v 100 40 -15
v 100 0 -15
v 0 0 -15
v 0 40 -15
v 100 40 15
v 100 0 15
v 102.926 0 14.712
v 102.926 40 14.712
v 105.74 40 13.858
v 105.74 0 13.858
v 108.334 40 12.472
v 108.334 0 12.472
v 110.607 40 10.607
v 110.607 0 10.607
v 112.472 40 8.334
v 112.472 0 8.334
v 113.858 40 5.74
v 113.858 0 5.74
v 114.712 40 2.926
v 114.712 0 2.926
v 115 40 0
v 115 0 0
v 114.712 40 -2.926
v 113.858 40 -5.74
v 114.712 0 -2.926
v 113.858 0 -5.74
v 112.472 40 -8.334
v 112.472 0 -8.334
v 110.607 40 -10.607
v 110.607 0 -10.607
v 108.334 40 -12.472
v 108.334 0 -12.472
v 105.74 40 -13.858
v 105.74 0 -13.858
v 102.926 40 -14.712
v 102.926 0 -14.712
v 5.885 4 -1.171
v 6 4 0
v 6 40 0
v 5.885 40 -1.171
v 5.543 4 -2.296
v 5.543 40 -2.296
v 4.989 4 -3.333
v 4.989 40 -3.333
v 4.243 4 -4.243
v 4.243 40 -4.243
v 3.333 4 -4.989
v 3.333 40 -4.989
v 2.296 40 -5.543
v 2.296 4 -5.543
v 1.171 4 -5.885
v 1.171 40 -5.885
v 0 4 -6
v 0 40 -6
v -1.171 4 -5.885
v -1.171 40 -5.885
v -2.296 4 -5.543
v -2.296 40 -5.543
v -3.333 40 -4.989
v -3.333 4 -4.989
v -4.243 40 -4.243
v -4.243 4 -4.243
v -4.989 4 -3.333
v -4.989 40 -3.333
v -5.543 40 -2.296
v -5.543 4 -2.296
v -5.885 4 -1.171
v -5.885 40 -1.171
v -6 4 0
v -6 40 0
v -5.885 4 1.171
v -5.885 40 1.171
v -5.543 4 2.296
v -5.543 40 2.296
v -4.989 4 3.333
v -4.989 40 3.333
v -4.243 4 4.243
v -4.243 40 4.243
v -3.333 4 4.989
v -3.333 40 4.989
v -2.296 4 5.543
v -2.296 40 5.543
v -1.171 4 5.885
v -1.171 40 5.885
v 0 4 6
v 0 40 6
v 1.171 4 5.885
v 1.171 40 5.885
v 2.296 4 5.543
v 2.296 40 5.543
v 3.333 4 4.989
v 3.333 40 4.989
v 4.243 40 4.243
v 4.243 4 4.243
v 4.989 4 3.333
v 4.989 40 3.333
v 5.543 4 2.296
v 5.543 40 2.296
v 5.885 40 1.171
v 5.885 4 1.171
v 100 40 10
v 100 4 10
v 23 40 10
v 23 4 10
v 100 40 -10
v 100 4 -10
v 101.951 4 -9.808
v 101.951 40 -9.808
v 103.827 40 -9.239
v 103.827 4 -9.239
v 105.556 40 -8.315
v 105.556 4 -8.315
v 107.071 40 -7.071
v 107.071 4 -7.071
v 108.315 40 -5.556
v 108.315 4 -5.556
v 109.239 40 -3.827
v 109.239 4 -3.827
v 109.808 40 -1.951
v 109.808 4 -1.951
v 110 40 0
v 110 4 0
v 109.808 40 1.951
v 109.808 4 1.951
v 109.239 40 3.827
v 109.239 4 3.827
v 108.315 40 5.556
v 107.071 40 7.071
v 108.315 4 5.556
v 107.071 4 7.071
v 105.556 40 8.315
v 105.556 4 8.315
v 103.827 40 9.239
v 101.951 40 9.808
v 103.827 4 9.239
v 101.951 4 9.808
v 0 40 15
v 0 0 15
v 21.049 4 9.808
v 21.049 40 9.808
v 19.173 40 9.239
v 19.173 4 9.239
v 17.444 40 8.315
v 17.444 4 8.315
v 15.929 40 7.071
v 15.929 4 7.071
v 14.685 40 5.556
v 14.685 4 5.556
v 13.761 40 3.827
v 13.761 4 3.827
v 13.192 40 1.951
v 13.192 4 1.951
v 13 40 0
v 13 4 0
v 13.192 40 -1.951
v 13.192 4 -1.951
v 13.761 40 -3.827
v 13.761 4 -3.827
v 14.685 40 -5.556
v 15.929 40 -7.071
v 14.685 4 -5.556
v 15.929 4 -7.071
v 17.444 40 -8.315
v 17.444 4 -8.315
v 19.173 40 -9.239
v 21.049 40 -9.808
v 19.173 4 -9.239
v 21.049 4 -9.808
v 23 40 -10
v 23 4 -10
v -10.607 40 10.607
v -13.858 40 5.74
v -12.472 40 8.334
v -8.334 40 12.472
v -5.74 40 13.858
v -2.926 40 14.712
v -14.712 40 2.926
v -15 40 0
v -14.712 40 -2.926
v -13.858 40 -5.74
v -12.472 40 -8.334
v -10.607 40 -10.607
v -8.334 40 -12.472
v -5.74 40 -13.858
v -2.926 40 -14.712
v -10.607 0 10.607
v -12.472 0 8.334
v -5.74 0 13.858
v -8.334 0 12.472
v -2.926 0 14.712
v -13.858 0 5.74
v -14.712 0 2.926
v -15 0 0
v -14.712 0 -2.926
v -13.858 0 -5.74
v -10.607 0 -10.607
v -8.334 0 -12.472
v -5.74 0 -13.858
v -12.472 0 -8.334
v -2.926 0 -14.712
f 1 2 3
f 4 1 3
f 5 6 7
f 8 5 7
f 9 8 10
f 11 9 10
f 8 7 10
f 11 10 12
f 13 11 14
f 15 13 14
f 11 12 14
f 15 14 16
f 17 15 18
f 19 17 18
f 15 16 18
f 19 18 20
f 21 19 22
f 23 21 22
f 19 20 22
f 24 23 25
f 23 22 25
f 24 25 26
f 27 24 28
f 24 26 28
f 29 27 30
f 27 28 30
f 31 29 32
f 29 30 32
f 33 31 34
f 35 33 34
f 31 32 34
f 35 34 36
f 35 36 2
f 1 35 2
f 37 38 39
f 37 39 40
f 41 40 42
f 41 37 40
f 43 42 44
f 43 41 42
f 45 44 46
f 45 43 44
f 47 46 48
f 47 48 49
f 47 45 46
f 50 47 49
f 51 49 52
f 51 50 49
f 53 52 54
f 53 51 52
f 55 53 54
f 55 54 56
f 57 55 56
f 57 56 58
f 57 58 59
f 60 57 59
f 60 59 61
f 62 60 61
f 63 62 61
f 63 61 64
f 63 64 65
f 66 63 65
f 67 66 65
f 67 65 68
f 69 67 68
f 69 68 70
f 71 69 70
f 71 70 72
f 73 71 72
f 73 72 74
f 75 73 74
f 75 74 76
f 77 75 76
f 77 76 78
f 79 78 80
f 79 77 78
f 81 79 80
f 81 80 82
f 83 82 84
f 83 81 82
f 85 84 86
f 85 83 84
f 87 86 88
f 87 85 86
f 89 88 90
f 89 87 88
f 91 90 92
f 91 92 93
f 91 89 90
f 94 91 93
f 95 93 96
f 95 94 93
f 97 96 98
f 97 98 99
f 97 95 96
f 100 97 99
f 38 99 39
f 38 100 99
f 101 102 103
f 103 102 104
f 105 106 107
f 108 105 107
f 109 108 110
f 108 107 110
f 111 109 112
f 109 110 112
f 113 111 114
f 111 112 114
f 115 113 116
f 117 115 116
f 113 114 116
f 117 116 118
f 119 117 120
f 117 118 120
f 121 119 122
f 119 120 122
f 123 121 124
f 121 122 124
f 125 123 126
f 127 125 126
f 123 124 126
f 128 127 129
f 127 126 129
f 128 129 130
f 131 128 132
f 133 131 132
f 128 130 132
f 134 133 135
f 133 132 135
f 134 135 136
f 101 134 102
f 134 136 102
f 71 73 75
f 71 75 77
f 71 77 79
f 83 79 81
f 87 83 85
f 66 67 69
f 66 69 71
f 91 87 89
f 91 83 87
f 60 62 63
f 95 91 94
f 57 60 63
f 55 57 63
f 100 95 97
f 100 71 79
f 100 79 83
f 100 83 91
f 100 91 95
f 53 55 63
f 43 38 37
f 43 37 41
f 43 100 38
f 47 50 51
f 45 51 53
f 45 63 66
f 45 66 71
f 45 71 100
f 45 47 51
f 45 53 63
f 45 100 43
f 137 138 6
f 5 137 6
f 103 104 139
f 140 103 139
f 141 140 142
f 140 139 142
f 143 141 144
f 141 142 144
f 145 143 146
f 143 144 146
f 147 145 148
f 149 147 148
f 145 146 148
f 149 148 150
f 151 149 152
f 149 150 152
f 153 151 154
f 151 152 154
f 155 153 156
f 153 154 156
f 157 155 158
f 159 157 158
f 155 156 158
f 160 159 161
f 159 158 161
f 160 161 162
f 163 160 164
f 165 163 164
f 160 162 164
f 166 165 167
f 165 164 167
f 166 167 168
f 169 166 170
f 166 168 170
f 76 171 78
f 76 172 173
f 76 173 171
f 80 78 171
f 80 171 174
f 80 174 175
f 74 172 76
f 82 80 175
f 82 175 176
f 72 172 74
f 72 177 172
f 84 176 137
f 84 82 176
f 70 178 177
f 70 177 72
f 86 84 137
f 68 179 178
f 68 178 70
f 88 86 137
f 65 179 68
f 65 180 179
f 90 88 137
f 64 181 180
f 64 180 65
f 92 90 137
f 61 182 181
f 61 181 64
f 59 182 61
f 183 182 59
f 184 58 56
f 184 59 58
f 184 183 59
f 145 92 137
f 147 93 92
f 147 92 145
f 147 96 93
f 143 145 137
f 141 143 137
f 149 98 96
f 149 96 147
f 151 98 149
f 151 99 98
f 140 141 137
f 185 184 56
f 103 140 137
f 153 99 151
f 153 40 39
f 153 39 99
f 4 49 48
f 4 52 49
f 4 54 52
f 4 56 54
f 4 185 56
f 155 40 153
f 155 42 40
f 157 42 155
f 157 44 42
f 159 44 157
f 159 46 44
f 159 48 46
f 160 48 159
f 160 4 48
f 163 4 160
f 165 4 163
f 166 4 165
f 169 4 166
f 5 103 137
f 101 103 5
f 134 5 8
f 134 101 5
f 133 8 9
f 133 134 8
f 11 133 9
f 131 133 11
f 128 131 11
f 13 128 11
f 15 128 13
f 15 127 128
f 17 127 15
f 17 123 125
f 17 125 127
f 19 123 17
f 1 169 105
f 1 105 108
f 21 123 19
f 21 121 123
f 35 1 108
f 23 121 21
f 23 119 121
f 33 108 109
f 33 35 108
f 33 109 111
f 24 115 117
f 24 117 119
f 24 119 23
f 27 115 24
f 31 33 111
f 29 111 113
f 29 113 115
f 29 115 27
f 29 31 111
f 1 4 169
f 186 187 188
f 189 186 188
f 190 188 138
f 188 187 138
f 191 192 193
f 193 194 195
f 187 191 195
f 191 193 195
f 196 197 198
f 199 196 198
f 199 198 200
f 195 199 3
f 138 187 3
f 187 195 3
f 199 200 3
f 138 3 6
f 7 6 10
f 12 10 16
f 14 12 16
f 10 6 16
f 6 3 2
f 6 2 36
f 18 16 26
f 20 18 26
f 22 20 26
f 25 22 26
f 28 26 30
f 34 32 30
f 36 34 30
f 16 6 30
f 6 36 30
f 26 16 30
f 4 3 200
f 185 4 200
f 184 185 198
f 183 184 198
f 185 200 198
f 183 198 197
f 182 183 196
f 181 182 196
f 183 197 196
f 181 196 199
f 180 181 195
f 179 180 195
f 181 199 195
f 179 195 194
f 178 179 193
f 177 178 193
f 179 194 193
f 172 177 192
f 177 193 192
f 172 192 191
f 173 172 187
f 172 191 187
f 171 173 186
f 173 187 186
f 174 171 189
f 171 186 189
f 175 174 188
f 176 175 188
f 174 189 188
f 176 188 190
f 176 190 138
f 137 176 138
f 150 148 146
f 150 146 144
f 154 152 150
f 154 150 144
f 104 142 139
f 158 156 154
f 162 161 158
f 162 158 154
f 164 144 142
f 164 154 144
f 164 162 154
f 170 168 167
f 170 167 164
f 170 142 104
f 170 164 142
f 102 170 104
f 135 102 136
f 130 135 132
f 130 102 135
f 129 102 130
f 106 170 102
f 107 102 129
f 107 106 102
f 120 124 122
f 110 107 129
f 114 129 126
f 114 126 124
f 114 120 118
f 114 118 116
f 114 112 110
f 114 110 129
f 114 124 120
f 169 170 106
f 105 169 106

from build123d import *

# Parameters (mm, degrees)
SKETCH1_R           = 6
BOSS_EXTRUDE1_DEPTH = 40
SKETCH1_2_R         = 6
BOSS_EXTRUDE2_DEPTH = 4


with BuildPart() as part:
    # Sketch1 → Boss-Extrude1 (new body)
    with BuildSketch(Plane(origin=(0, 0, 0), x_dir=(1, 0, 0), z_dir=(0, 1, 0))):
        with BuildLine():
            Line((0, -15), (100, -15))
            ThreePointArc((100, -15), (115, 0), (100, 15))
            Line((100, 15), (0, 15))
            ThreePointArc((0, 15), (-15, 0), (0, -15))
        make_face()
        Circle(SKETCH1_R, mode=Mode.SUBTRACT)
        with BuildLine():
            Line((23, 10), (100, 10))
            ThreePointArc((100, 10), (110, 0), (100, -10))
            Line((100, -10), (23, -10))
            ThreePointArc((23, -10), (13, 0), (23, 10))
        make_face(mode=Mode.SUBTRACT)
    extrude(amount=BOSS_EXTRUDE1_DEPTH)

    # Sketch1<2> → Boss-Extrude2 (add)
    with BuildSketch(Plane(origin=(0, 0, 0), x_dir=(1, 0, 0), z_dir=(0, 1, 0))):
        with BuildLine():
            Line((100, 10), (23, 10))
            ThreePointArc((23, 10), (13, 0), (23, -10))
            Line((23, -10), (100, -10))
            ThreePointArc((100, -10), (110, 0), (100, 10))
        make_face()
        Circle(SKETCH1_2_R)
    extrude(amount=BOSS_EXTRUDE2_DEPTH)


solid = part.part
